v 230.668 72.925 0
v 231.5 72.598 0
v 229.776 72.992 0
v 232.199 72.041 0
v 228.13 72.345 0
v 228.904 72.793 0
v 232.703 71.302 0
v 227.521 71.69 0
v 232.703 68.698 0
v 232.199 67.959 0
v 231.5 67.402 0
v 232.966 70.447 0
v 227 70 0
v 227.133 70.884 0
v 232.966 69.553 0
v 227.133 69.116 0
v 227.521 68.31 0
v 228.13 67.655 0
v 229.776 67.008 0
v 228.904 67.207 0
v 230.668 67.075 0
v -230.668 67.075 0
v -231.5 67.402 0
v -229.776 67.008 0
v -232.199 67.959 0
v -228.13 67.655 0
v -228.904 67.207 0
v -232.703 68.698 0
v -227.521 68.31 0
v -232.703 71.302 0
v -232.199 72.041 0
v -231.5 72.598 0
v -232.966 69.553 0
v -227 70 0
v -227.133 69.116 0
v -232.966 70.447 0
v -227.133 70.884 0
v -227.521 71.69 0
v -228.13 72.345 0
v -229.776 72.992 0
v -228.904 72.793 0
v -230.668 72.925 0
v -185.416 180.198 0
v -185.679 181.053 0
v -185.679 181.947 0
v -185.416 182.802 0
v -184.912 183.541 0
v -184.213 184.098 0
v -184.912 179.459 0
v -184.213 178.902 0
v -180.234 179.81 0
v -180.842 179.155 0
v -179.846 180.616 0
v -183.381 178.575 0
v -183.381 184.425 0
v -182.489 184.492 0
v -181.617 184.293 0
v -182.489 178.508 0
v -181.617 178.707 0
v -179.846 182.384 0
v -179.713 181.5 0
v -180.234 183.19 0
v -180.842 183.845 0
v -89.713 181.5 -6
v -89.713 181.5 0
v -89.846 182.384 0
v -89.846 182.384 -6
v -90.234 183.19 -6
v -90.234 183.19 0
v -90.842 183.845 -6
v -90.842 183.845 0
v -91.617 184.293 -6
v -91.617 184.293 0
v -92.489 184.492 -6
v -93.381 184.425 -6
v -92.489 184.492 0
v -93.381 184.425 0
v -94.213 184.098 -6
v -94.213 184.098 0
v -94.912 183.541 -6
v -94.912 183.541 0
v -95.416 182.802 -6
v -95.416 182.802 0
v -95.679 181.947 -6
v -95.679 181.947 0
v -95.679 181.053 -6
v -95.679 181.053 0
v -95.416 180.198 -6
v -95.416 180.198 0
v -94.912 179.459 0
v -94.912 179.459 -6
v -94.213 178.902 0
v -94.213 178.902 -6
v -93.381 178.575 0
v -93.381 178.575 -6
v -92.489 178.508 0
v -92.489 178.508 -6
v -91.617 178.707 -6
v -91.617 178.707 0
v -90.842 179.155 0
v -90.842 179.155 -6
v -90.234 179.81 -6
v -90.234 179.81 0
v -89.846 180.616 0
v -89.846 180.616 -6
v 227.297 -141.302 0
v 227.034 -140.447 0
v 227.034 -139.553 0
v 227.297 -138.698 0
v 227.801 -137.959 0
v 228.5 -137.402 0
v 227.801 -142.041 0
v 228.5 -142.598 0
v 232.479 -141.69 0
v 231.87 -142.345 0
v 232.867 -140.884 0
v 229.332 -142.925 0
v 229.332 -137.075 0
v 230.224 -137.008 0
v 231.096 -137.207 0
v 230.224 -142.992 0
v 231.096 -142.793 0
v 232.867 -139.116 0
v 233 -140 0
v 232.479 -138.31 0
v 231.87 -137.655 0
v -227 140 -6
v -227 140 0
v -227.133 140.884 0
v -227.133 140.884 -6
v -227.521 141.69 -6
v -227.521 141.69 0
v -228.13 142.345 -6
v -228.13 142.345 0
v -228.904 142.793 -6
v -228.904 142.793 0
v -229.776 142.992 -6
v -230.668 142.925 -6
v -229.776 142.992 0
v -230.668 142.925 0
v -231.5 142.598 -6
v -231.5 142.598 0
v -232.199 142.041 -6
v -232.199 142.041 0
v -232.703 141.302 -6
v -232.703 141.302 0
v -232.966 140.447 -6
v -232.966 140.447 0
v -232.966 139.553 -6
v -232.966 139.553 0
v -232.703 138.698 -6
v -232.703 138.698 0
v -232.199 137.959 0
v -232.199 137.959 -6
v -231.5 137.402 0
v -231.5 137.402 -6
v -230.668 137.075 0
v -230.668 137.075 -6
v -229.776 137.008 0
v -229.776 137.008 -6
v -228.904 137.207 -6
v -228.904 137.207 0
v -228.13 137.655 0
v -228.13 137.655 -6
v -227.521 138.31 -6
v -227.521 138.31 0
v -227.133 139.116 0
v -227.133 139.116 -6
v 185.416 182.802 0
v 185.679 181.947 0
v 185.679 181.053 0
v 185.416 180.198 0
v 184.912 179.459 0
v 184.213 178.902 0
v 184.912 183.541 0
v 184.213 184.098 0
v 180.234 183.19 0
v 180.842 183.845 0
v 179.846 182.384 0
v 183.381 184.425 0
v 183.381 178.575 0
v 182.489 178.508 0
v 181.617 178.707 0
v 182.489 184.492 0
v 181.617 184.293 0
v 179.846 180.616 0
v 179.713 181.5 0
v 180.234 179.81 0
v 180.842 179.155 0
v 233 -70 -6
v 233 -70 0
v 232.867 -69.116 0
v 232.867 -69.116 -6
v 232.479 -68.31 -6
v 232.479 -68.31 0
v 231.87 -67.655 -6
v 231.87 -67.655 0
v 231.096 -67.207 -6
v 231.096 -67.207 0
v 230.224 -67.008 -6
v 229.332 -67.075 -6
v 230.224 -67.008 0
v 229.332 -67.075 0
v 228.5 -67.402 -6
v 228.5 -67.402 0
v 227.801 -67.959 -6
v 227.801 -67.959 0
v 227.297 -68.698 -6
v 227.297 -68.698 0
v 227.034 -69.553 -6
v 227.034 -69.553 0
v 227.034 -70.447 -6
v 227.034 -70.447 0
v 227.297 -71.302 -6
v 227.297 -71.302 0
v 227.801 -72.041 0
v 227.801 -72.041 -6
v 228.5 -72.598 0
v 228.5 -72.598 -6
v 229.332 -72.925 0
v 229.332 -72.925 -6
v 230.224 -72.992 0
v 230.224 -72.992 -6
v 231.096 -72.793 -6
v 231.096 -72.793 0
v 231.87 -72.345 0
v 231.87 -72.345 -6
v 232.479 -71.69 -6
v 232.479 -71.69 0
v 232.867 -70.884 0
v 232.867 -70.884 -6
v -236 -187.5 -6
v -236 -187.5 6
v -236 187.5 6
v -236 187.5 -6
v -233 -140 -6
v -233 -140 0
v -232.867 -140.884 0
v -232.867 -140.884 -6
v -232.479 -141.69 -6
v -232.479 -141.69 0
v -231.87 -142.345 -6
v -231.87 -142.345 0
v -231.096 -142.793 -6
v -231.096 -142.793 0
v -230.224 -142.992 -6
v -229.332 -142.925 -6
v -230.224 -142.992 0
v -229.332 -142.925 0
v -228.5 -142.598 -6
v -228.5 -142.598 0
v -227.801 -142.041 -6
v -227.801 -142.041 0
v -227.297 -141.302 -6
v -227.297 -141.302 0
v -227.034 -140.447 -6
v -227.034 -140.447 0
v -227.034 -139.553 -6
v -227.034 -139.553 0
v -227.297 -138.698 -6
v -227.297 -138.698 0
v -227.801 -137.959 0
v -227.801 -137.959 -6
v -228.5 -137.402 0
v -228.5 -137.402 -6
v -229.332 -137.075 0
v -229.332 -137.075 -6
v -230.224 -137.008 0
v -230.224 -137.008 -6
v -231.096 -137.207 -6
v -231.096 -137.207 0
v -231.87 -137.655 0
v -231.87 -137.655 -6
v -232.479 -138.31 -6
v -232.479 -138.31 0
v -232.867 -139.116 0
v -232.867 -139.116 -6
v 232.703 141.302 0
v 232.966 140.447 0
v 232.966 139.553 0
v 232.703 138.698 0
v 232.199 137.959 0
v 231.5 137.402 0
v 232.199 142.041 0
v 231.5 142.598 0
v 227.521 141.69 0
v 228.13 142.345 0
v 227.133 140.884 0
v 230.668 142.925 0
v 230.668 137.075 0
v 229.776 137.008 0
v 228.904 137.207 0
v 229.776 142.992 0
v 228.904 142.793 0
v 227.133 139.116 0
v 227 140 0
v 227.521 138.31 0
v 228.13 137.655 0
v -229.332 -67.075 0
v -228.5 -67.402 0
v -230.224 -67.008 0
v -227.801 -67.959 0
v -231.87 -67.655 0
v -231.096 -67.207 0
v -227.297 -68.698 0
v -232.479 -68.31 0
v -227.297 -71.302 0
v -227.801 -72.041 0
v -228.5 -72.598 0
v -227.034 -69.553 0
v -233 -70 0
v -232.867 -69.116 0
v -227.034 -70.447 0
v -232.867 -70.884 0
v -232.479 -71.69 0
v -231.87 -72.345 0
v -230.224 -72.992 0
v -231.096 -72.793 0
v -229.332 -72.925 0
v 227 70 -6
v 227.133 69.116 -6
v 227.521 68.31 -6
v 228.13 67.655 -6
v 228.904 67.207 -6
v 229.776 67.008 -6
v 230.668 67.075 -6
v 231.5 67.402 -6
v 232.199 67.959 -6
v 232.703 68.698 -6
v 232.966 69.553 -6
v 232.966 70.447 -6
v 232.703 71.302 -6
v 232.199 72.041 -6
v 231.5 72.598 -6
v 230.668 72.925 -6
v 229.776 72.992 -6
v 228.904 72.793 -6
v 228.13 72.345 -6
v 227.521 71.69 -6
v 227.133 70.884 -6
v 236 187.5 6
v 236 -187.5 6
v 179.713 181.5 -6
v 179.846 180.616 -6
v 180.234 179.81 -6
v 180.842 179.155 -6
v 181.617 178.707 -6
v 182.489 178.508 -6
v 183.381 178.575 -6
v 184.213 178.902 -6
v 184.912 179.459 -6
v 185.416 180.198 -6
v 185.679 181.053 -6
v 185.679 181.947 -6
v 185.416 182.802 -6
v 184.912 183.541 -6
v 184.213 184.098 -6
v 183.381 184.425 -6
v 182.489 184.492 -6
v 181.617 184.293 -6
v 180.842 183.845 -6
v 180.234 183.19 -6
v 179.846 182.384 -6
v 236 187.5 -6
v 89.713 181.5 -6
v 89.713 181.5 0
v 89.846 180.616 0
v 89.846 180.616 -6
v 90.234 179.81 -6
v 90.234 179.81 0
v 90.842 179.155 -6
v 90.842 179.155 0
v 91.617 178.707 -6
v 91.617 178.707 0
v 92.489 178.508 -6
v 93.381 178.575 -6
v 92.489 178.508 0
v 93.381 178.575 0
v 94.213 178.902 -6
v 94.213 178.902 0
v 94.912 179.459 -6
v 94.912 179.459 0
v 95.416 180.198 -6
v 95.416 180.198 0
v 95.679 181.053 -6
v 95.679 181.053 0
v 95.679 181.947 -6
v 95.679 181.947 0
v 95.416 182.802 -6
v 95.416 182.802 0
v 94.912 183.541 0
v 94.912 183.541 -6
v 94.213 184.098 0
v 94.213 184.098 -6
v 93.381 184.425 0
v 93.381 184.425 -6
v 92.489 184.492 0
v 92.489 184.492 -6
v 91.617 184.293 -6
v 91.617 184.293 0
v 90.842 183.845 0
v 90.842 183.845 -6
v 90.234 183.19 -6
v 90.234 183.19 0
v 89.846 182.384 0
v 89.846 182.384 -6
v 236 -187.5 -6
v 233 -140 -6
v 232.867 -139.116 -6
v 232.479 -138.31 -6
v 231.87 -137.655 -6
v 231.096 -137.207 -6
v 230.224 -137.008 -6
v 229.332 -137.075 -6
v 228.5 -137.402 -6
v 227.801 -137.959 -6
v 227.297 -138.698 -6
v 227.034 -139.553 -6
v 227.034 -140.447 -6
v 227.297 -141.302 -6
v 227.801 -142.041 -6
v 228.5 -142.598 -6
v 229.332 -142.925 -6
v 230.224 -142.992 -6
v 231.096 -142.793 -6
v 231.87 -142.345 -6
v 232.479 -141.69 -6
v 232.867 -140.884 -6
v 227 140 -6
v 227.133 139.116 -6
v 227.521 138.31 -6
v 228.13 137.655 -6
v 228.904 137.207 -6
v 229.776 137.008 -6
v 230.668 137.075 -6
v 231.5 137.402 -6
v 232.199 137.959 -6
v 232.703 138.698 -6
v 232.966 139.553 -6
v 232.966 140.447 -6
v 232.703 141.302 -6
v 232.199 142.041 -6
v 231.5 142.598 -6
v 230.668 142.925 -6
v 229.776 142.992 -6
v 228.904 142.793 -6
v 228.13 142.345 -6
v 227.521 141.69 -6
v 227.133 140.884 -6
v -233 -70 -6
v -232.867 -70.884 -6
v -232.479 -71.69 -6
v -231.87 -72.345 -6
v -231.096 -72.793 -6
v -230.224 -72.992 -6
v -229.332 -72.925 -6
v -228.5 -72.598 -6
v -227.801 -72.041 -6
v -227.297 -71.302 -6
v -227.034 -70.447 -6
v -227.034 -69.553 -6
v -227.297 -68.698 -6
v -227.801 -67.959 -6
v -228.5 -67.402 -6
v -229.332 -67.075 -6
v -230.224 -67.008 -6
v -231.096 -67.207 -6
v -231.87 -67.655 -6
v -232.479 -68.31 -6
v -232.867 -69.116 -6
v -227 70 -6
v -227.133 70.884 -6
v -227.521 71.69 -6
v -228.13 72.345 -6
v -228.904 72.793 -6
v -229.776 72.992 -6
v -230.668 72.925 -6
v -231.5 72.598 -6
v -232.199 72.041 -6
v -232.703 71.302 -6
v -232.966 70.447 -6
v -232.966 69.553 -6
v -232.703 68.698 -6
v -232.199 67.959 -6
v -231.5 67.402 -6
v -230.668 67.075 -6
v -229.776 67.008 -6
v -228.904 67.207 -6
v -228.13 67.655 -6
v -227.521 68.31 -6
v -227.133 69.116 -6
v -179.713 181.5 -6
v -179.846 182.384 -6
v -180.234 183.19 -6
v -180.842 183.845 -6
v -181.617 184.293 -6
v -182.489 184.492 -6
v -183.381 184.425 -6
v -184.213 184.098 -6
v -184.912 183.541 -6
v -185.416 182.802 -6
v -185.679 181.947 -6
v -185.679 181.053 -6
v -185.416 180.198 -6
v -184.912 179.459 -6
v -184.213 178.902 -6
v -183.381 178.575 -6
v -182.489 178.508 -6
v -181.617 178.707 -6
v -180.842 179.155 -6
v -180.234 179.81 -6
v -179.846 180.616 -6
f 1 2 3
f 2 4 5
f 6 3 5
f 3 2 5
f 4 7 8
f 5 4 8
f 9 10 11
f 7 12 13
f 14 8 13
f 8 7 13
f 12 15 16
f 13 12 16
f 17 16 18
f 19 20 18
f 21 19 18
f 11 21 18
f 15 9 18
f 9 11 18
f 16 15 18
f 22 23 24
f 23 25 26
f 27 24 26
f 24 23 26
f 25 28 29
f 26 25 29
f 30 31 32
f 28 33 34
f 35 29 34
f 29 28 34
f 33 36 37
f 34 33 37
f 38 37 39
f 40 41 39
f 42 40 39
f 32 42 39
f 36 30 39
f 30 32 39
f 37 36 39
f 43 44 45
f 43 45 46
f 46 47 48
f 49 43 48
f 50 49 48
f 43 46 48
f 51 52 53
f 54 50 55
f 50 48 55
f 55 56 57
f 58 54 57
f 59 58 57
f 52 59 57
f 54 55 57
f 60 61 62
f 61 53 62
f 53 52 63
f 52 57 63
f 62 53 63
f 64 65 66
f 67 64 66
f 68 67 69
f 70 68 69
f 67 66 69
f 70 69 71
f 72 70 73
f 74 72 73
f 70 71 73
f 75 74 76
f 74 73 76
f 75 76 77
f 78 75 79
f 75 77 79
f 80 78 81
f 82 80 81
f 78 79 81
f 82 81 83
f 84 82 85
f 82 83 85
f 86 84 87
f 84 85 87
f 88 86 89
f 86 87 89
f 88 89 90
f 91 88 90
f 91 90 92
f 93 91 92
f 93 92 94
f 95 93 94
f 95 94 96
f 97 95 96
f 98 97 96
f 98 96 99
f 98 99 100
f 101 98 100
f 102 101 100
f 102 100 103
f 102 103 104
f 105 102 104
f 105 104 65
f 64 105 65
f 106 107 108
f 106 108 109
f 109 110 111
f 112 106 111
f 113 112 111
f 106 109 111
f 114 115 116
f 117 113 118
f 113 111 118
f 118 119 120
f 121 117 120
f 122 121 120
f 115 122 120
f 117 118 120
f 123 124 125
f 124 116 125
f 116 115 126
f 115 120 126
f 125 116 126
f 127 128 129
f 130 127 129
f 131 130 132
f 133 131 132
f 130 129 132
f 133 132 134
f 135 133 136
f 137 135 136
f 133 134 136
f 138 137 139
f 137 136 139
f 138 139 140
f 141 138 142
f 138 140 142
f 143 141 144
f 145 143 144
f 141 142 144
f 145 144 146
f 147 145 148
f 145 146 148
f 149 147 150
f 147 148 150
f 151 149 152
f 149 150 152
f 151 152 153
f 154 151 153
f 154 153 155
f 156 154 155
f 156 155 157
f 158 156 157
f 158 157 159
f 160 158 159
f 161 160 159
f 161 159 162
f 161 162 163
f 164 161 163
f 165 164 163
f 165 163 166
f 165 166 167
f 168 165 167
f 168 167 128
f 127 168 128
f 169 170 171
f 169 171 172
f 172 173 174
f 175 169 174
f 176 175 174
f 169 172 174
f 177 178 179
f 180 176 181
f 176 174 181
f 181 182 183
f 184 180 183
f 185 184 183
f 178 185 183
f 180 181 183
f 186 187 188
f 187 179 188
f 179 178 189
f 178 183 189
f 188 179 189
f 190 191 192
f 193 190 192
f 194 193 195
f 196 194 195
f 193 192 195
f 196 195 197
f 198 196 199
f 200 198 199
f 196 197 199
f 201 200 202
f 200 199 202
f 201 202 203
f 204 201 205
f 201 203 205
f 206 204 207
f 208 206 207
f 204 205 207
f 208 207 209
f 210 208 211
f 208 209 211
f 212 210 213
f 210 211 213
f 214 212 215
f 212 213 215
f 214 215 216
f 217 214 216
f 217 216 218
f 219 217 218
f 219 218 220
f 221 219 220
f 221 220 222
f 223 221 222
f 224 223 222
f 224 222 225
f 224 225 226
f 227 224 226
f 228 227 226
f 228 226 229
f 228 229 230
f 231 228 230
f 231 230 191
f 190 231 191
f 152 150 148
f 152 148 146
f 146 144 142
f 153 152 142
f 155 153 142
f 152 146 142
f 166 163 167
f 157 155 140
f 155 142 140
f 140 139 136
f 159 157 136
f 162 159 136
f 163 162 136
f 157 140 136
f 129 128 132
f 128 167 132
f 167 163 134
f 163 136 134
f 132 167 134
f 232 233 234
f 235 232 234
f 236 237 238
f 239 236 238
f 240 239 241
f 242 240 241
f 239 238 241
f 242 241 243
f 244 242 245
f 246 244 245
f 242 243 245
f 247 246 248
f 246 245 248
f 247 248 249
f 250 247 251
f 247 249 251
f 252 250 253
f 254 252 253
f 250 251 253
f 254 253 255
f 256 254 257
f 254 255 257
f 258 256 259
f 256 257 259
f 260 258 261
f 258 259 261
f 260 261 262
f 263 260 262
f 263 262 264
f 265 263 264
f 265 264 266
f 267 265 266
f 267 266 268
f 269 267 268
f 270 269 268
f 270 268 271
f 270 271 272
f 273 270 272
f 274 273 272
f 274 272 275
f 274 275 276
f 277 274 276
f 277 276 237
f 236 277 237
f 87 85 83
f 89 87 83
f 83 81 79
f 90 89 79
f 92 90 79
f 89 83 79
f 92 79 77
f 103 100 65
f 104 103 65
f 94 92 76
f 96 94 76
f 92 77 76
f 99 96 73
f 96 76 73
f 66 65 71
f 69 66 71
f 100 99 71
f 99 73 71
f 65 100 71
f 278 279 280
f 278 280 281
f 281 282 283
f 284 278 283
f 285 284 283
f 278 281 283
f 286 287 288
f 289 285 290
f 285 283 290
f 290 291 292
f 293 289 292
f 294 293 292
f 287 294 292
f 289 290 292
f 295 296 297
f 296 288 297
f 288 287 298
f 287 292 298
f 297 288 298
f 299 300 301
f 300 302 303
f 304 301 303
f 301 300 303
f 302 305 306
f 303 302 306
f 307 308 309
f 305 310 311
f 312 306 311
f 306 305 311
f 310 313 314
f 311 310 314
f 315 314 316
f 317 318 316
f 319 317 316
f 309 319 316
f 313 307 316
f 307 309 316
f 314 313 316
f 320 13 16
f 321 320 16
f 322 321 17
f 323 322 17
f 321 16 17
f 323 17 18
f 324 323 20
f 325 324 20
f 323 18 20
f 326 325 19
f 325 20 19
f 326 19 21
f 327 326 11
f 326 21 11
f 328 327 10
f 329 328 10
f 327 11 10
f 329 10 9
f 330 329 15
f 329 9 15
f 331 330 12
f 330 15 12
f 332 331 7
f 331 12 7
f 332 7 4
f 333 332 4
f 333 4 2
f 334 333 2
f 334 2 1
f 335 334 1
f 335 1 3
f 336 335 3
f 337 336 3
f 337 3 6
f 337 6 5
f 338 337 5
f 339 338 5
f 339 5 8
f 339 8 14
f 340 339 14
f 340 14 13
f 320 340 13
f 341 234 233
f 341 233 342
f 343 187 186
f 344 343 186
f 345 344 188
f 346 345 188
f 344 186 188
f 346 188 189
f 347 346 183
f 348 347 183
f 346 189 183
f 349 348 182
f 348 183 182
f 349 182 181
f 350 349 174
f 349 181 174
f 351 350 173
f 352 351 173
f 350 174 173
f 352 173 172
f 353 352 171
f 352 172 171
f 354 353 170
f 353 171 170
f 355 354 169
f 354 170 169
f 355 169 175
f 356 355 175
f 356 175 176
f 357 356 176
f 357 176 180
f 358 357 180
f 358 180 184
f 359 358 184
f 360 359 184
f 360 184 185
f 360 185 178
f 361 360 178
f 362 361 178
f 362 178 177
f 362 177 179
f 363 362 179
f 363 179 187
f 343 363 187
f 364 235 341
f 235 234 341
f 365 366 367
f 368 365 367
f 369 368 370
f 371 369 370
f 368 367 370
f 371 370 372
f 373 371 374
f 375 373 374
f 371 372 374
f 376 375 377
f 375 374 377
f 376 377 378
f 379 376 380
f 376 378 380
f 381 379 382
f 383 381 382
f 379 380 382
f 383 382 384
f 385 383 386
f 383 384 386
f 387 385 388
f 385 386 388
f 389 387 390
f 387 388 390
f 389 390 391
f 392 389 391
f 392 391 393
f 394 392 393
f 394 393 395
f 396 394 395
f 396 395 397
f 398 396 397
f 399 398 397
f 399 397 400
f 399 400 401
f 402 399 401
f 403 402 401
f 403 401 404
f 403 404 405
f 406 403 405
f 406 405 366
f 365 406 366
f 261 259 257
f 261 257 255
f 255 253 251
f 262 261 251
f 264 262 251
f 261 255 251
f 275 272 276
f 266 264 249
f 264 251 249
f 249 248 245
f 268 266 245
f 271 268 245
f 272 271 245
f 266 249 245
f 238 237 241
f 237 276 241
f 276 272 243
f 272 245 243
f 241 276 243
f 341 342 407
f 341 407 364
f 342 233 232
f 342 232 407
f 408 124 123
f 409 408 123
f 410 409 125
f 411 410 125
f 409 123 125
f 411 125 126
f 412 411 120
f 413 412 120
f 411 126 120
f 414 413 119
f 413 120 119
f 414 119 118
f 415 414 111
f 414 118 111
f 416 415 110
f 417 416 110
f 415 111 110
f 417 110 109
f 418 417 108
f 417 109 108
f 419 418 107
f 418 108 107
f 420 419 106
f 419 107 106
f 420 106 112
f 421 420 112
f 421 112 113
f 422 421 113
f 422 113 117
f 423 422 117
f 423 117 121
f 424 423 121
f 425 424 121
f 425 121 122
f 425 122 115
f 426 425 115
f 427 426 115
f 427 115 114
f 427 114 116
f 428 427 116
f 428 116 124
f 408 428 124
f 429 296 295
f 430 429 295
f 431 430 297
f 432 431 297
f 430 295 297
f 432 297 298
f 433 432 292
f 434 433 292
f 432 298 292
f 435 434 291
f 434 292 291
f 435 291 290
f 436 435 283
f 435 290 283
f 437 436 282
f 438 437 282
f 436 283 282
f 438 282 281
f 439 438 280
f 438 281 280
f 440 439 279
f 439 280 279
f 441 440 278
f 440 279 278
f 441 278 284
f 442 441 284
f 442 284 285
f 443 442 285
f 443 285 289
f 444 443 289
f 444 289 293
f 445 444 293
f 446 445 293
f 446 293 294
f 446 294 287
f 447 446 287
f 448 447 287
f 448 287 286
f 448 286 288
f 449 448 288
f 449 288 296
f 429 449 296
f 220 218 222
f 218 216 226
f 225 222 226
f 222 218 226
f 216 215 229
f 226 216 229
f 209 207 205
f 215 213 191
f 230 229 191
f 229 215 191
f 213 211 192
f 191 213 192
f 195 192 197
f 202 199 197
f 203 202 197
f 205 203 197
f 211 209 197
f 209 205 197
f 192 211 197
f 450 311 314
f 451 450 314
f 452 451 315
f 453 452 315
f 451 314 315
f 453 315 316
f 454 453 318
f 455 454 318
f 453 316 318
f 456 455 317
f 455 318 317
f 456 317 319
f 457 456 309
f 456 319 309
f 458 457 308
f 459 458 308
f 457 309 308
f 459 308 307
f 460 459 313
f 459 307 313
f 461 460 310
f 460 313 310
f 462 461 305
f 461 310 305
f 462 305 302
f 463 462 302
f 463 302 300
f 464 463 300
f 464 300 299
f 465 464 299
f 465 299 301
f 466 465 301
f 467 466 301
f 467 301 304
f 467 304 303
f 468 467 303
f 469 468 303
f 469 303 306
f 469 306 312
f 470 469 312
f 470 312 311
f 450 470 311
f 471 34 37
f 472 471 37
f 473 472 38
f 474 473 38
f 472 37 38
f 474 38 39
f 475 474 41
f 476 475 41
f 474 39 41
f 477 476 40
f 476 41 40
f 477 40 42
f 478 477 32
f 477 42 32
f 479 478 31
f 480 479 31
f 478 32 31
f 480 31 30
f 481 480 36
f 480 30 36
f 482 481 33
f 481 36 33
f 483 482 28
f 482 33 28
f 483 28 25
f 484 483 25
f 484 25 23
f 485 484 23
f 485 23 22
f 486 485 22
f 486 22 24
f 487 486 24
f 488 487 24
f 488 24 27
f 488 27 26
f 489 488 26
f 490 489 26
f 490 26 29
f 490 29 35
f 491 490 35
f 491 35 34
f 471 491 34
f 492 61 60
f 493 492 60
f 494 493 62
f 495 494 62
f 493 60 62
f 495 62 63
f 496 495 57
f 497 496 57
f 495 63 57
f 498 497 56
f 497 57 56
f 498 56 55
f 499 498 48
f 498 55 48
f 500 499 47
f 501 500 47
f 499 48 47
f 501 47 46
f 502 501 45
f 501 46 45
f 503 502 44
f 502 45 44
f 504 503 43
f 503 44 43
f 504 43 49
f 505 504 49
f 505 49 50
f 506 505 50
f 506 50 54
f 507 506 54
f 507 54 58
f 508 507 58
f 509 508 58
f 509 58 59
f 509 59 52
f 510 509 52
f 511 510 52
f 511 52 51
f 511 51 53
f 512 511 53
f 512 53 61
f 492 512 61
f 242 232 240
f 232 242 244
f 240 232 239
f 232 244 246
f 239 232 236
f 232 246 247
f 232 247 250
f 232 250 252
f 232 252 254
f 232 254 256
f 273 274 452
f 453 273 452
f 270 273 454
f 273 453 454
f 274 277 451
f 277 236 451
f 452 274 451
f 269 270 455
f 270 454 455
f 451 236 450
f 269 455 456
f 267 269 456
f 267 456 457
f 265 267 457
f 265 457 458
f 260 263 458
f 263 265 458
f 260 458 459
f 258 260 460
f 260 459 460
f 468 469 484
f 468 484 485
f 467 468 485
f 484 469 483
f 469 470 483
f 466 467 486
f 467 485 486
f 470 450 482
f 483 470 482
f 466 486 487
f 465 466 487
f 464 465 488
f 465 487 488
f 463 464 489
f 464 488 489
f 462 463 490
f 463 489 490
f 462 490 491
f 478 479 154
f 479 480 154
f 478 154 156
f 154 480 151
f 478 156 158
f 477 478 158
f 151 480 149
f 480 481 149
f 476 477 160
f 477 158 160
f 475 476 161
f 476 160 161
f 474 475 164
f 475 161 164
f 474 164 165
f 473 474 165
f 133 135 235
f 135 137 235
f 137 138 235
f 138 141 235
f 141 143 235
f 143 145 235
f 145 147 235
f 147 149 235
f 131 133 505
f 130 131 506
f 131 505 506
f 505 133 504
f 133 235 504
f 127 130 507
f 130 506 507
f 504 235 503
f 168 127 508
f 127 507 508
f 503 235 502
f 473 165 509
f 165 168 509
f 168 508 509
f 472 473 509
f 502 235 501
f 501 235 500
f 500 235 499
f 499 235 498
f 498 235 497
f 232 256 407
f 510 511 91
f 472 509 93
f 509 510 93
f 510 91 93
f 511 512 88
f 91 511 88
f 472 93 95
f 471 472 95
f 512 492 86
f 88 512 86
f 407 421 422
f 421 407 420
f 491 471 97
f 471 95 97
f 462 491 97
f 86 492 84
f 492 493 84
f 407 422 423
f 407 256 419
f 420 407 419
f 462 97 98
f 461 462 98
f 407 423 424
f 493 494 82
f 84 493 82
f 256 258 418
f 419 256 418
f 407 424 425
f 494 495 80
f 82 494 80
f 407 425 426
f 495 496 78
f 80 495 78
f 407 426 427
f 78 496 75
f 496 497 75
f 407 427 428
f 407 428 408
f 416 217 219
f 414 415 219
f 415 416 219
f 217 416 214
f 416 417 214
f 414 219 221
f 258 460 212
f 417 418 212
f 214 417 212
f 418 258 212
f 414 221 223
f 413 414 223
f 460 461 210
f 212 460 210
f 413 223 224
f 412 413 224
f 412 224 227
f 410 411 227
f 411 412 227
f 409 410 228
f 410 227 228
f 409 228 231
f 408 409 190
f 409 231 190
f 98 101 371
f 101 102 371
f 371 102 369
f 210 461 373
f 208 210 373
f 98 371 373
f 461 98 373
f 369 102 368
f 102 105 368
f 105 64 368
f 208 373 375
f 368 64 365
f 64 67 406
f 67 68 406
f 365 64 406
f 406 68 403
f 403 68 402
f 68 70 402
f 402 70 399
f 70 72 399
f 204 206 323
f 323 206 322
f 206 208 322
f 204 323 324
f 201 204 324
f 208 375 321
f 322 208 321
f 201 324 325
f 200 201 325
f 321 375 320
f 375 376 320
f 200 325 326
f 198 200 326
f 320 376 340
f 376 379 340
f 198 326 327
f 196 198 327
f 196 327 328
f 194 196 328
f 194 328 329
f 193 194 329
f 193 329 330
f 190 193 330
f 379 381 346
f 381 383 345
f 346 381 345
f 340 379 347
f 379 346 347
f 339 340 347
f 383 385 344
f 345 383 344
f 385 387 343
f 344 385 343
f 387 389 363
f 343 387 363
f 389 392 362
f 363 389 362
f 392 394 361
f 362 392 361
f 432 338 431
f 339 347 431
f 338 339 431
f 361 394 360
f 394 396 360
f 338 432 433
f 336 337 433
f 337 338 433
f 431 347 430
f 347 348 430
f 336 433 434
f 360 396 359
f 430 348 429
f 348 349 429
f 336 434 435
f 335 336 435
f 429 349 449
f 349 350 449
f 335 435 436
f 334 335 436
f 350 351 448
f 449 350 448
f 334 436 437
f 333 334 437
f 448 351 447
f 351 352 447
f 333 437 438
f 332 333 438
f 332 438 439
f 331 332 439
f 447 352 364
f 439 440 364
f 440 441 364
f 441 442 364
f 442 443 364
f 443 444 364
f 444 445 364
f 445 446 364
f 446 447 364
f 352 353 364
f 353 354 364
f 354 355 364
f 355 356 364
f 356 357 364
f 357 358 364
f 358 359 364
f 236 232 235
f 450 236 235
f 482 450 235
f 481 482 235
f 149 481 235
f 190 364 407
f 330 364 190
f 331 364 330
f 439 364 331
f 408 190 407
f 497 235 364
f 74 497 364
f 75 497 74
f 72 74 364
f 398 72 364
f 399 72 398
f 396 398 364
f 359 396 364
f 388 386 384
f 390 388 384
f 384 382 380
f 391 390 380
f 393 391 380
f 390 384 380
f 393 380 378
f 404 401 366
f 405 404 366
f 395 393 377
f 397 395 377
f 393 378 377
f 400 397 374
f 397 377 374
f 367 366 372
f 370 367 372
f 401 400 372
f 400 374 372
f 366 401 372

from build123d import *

# Parameters (mm, degrees)
CROQUIS1_W              = 472
CROQUIS1_H              = 375
SALIENTE_EXTRUIR1_DEPTH = 6
CROQUIS2_R              = 3
CORTAR_EXTRUIR1_DEPTH   = 12


with BuildPart() as part:
    # Croquis1 → Saliente-Extruir1 (new, symmetric)
    with BuildSketch(Plane.XY):
        Rectangle(CROQUIS1_W, CROQUIS1_H)
    extrude(amount=SALIENTE_EXTRUIR1_DEPTH, both=True)

    # Croquis2 → Cortar-Extruir1 (cut)
    with BuildSketch(Plane.XY):
        with Locations((-230, 70)):
            Circle(CROQUIS2_R)
        with Locations((-230, 140)):
            Circle(CROQUIS2_R)
        with Locations((-182.712951509, 181.5)):
            Circle(CROQUIS2_R)
        with Locations((-92.712951509, 181.5)):
            Circle(CROQUIS2_R)
        with Locations(Location((92.712951509, 181.5, 0), (0, 0, 180))):
            Circle(CROQUIS2_R)
        with Locations(Location((182.712951509, 181.5, 0), (0, 0, 180))):
            Circle(CROQUIS2_R)
        with Locations(Location((-230, -140, 0), (0, 0, 180))):
            Circle(CROQUIS2_R)
        with Locations(Location((-230, -70, 0), (0, 0, 180))):
            Circle(CROQUIS2_R)
        with Locations((230, -140)):
            Circle(CROQUIS2_R)
        with Locations((230, -70)):
            Circle(CROQUIS2_R)
        with Locations(Location((230, 70, 0), (0, 0, 180))):
            Circle(CROQUIS2_R)
        with Locations(Location((230, 140, 0), (0, 0, 180))):
            Circle(CROQUIS2_R)
    extrude(amount=-CORTAR_EXTRUIR1_DEPTH, mode=Mode.SUBTRACT)


solid = part.part
